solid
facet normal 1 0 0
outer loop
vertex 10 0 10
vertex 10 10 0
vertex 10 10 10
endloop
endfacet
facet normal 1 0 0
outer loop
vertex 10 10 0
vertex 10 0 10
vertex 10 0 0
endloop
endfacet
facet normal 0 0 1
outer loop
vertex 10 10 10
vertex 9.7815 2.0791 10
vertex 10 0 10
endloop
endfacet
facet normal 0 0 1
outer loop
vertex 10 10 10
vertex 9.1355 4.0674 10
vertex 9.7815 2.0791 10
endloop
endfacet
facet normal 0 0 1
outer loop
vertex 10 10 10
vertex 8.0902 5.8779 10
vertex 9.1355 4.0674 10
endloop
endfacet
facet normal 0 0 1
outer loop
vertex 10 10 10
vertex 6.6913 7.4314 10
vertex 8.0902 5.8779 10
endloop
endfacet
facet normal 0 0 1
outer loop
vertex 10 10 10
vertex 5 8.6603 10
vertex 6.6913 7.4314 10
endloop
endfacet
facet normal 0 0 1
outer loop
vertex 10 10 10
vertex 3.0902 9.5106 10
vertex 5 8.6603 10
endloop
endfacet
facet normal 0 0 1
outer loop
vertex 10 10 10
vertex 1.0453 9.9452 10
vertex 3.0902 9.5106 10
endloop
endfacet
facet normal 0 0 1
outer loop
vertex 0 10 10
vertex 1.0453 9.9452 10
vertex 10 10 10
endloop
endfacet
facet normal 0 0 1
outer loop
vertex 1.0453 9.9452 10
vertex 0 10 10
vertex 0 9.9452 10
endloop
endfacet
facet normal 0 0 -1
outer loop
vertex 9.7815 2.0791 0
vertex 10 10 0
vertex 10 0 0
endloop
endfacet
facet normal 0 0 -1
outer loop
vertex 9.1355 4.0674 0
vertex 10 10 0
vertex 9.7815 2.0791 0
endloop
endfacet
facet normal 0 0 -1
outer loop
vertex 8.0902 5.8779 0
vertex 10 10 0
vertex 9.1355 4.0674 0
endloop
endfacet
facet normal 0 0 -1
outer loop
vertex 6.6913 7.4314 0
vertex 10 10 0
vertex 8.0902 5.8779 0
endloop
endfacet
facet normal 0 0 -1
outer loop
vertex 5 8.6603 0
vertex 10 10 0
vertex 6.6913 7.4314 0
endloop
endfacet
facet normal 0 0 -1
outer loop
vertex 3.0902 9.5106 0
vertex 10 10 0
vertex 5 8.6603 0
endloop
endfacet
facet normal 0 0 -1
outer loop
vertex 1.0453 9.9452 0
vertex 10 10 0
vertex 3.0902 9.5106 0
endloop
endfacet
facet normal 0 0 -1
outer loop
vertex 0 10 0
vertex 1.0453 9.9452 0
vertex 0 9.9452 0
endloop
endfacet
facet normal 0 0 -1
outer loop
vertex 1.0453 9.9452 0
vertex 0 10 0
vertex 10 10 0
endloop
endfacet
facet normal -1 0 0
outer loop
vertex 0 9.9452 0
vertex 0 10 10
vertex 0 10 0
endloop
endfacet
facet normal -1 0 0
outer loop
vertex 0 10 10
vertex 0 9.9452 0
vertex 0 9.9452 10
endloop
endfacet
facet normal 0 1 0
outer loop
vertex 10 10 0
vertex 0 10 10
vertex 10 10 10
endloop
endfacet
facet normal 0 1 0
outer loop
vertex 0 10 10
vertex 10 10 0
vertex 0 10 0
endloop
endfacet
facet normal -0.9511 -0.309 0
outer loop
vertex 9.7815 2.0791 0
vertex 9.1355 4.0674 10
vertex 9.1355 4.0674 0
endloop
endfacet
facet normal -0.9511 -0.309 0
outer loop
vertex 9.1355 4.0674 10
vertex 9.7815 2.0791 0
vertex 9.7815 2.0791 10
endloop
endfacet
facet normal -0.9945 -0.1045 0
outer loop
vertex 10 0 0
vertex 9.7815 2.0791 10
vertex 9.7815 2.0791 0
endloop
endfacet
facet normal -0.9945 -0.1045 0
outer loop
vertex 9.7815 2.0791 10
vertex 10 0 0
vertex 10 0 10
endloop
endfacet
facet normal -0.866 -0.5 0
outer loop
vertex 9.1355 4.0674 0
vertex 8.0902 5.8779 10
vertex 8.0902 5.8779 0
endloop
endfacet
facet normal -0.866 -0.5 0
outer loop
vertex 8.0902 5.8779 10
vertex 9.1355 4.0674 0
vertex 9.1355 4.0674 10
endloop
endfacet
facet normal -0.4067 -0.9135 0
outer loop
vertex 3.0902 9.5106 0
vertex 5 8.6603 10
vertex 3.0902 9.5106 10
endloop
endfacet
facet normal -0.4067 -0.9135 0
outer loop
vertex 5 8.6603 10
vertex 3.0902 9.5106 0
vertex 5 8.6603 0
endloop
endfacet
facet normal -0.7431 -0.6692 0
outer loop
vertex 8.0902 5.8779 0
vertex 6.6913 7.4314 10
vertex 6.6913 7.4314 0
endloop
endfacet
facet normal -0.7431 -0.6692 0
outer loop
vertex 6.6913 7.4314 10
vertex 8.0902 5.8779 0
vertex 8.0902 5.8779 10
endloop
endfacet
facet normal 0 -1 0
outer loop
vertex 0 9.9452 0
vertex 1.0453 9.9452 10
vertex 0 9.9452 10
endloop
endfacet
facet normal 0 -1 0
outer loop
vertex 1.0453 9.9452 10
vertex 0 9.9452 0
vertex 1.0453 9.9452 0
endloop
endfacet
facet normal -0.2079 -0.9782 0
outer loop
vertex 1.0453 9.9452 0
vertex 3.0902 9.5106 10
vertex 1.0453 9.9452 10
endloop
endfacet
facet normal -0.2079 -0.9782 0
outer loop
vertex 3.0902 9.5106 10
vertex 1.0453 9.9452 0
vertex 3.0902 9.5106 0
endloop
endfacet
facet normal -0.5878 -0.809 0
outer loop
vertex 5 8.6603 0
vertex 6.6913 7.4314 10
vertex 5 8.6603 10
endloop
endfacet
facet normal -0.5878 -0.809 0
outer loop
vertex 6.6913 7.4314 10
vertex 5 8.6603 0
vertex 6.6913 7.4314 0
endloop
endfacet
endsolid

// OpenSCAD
module tube(r1, r2, h ){
    difference() {
        cylinder(r=r1, h=h);
        cylinder(r=r2, h=h);
    }
}

module taperout(r,h) {
    intersection(){
        cylinder(r=r, h=h);
        cube([r,r,h]);
    }
}

module taperin(r,h) {
    difference(){
        cube([r,r,h]);
        cylinder(r=r, h=h);
    }
}

//tube(20,10,10);

// taperout(10,10);

 taperin(10,10);
